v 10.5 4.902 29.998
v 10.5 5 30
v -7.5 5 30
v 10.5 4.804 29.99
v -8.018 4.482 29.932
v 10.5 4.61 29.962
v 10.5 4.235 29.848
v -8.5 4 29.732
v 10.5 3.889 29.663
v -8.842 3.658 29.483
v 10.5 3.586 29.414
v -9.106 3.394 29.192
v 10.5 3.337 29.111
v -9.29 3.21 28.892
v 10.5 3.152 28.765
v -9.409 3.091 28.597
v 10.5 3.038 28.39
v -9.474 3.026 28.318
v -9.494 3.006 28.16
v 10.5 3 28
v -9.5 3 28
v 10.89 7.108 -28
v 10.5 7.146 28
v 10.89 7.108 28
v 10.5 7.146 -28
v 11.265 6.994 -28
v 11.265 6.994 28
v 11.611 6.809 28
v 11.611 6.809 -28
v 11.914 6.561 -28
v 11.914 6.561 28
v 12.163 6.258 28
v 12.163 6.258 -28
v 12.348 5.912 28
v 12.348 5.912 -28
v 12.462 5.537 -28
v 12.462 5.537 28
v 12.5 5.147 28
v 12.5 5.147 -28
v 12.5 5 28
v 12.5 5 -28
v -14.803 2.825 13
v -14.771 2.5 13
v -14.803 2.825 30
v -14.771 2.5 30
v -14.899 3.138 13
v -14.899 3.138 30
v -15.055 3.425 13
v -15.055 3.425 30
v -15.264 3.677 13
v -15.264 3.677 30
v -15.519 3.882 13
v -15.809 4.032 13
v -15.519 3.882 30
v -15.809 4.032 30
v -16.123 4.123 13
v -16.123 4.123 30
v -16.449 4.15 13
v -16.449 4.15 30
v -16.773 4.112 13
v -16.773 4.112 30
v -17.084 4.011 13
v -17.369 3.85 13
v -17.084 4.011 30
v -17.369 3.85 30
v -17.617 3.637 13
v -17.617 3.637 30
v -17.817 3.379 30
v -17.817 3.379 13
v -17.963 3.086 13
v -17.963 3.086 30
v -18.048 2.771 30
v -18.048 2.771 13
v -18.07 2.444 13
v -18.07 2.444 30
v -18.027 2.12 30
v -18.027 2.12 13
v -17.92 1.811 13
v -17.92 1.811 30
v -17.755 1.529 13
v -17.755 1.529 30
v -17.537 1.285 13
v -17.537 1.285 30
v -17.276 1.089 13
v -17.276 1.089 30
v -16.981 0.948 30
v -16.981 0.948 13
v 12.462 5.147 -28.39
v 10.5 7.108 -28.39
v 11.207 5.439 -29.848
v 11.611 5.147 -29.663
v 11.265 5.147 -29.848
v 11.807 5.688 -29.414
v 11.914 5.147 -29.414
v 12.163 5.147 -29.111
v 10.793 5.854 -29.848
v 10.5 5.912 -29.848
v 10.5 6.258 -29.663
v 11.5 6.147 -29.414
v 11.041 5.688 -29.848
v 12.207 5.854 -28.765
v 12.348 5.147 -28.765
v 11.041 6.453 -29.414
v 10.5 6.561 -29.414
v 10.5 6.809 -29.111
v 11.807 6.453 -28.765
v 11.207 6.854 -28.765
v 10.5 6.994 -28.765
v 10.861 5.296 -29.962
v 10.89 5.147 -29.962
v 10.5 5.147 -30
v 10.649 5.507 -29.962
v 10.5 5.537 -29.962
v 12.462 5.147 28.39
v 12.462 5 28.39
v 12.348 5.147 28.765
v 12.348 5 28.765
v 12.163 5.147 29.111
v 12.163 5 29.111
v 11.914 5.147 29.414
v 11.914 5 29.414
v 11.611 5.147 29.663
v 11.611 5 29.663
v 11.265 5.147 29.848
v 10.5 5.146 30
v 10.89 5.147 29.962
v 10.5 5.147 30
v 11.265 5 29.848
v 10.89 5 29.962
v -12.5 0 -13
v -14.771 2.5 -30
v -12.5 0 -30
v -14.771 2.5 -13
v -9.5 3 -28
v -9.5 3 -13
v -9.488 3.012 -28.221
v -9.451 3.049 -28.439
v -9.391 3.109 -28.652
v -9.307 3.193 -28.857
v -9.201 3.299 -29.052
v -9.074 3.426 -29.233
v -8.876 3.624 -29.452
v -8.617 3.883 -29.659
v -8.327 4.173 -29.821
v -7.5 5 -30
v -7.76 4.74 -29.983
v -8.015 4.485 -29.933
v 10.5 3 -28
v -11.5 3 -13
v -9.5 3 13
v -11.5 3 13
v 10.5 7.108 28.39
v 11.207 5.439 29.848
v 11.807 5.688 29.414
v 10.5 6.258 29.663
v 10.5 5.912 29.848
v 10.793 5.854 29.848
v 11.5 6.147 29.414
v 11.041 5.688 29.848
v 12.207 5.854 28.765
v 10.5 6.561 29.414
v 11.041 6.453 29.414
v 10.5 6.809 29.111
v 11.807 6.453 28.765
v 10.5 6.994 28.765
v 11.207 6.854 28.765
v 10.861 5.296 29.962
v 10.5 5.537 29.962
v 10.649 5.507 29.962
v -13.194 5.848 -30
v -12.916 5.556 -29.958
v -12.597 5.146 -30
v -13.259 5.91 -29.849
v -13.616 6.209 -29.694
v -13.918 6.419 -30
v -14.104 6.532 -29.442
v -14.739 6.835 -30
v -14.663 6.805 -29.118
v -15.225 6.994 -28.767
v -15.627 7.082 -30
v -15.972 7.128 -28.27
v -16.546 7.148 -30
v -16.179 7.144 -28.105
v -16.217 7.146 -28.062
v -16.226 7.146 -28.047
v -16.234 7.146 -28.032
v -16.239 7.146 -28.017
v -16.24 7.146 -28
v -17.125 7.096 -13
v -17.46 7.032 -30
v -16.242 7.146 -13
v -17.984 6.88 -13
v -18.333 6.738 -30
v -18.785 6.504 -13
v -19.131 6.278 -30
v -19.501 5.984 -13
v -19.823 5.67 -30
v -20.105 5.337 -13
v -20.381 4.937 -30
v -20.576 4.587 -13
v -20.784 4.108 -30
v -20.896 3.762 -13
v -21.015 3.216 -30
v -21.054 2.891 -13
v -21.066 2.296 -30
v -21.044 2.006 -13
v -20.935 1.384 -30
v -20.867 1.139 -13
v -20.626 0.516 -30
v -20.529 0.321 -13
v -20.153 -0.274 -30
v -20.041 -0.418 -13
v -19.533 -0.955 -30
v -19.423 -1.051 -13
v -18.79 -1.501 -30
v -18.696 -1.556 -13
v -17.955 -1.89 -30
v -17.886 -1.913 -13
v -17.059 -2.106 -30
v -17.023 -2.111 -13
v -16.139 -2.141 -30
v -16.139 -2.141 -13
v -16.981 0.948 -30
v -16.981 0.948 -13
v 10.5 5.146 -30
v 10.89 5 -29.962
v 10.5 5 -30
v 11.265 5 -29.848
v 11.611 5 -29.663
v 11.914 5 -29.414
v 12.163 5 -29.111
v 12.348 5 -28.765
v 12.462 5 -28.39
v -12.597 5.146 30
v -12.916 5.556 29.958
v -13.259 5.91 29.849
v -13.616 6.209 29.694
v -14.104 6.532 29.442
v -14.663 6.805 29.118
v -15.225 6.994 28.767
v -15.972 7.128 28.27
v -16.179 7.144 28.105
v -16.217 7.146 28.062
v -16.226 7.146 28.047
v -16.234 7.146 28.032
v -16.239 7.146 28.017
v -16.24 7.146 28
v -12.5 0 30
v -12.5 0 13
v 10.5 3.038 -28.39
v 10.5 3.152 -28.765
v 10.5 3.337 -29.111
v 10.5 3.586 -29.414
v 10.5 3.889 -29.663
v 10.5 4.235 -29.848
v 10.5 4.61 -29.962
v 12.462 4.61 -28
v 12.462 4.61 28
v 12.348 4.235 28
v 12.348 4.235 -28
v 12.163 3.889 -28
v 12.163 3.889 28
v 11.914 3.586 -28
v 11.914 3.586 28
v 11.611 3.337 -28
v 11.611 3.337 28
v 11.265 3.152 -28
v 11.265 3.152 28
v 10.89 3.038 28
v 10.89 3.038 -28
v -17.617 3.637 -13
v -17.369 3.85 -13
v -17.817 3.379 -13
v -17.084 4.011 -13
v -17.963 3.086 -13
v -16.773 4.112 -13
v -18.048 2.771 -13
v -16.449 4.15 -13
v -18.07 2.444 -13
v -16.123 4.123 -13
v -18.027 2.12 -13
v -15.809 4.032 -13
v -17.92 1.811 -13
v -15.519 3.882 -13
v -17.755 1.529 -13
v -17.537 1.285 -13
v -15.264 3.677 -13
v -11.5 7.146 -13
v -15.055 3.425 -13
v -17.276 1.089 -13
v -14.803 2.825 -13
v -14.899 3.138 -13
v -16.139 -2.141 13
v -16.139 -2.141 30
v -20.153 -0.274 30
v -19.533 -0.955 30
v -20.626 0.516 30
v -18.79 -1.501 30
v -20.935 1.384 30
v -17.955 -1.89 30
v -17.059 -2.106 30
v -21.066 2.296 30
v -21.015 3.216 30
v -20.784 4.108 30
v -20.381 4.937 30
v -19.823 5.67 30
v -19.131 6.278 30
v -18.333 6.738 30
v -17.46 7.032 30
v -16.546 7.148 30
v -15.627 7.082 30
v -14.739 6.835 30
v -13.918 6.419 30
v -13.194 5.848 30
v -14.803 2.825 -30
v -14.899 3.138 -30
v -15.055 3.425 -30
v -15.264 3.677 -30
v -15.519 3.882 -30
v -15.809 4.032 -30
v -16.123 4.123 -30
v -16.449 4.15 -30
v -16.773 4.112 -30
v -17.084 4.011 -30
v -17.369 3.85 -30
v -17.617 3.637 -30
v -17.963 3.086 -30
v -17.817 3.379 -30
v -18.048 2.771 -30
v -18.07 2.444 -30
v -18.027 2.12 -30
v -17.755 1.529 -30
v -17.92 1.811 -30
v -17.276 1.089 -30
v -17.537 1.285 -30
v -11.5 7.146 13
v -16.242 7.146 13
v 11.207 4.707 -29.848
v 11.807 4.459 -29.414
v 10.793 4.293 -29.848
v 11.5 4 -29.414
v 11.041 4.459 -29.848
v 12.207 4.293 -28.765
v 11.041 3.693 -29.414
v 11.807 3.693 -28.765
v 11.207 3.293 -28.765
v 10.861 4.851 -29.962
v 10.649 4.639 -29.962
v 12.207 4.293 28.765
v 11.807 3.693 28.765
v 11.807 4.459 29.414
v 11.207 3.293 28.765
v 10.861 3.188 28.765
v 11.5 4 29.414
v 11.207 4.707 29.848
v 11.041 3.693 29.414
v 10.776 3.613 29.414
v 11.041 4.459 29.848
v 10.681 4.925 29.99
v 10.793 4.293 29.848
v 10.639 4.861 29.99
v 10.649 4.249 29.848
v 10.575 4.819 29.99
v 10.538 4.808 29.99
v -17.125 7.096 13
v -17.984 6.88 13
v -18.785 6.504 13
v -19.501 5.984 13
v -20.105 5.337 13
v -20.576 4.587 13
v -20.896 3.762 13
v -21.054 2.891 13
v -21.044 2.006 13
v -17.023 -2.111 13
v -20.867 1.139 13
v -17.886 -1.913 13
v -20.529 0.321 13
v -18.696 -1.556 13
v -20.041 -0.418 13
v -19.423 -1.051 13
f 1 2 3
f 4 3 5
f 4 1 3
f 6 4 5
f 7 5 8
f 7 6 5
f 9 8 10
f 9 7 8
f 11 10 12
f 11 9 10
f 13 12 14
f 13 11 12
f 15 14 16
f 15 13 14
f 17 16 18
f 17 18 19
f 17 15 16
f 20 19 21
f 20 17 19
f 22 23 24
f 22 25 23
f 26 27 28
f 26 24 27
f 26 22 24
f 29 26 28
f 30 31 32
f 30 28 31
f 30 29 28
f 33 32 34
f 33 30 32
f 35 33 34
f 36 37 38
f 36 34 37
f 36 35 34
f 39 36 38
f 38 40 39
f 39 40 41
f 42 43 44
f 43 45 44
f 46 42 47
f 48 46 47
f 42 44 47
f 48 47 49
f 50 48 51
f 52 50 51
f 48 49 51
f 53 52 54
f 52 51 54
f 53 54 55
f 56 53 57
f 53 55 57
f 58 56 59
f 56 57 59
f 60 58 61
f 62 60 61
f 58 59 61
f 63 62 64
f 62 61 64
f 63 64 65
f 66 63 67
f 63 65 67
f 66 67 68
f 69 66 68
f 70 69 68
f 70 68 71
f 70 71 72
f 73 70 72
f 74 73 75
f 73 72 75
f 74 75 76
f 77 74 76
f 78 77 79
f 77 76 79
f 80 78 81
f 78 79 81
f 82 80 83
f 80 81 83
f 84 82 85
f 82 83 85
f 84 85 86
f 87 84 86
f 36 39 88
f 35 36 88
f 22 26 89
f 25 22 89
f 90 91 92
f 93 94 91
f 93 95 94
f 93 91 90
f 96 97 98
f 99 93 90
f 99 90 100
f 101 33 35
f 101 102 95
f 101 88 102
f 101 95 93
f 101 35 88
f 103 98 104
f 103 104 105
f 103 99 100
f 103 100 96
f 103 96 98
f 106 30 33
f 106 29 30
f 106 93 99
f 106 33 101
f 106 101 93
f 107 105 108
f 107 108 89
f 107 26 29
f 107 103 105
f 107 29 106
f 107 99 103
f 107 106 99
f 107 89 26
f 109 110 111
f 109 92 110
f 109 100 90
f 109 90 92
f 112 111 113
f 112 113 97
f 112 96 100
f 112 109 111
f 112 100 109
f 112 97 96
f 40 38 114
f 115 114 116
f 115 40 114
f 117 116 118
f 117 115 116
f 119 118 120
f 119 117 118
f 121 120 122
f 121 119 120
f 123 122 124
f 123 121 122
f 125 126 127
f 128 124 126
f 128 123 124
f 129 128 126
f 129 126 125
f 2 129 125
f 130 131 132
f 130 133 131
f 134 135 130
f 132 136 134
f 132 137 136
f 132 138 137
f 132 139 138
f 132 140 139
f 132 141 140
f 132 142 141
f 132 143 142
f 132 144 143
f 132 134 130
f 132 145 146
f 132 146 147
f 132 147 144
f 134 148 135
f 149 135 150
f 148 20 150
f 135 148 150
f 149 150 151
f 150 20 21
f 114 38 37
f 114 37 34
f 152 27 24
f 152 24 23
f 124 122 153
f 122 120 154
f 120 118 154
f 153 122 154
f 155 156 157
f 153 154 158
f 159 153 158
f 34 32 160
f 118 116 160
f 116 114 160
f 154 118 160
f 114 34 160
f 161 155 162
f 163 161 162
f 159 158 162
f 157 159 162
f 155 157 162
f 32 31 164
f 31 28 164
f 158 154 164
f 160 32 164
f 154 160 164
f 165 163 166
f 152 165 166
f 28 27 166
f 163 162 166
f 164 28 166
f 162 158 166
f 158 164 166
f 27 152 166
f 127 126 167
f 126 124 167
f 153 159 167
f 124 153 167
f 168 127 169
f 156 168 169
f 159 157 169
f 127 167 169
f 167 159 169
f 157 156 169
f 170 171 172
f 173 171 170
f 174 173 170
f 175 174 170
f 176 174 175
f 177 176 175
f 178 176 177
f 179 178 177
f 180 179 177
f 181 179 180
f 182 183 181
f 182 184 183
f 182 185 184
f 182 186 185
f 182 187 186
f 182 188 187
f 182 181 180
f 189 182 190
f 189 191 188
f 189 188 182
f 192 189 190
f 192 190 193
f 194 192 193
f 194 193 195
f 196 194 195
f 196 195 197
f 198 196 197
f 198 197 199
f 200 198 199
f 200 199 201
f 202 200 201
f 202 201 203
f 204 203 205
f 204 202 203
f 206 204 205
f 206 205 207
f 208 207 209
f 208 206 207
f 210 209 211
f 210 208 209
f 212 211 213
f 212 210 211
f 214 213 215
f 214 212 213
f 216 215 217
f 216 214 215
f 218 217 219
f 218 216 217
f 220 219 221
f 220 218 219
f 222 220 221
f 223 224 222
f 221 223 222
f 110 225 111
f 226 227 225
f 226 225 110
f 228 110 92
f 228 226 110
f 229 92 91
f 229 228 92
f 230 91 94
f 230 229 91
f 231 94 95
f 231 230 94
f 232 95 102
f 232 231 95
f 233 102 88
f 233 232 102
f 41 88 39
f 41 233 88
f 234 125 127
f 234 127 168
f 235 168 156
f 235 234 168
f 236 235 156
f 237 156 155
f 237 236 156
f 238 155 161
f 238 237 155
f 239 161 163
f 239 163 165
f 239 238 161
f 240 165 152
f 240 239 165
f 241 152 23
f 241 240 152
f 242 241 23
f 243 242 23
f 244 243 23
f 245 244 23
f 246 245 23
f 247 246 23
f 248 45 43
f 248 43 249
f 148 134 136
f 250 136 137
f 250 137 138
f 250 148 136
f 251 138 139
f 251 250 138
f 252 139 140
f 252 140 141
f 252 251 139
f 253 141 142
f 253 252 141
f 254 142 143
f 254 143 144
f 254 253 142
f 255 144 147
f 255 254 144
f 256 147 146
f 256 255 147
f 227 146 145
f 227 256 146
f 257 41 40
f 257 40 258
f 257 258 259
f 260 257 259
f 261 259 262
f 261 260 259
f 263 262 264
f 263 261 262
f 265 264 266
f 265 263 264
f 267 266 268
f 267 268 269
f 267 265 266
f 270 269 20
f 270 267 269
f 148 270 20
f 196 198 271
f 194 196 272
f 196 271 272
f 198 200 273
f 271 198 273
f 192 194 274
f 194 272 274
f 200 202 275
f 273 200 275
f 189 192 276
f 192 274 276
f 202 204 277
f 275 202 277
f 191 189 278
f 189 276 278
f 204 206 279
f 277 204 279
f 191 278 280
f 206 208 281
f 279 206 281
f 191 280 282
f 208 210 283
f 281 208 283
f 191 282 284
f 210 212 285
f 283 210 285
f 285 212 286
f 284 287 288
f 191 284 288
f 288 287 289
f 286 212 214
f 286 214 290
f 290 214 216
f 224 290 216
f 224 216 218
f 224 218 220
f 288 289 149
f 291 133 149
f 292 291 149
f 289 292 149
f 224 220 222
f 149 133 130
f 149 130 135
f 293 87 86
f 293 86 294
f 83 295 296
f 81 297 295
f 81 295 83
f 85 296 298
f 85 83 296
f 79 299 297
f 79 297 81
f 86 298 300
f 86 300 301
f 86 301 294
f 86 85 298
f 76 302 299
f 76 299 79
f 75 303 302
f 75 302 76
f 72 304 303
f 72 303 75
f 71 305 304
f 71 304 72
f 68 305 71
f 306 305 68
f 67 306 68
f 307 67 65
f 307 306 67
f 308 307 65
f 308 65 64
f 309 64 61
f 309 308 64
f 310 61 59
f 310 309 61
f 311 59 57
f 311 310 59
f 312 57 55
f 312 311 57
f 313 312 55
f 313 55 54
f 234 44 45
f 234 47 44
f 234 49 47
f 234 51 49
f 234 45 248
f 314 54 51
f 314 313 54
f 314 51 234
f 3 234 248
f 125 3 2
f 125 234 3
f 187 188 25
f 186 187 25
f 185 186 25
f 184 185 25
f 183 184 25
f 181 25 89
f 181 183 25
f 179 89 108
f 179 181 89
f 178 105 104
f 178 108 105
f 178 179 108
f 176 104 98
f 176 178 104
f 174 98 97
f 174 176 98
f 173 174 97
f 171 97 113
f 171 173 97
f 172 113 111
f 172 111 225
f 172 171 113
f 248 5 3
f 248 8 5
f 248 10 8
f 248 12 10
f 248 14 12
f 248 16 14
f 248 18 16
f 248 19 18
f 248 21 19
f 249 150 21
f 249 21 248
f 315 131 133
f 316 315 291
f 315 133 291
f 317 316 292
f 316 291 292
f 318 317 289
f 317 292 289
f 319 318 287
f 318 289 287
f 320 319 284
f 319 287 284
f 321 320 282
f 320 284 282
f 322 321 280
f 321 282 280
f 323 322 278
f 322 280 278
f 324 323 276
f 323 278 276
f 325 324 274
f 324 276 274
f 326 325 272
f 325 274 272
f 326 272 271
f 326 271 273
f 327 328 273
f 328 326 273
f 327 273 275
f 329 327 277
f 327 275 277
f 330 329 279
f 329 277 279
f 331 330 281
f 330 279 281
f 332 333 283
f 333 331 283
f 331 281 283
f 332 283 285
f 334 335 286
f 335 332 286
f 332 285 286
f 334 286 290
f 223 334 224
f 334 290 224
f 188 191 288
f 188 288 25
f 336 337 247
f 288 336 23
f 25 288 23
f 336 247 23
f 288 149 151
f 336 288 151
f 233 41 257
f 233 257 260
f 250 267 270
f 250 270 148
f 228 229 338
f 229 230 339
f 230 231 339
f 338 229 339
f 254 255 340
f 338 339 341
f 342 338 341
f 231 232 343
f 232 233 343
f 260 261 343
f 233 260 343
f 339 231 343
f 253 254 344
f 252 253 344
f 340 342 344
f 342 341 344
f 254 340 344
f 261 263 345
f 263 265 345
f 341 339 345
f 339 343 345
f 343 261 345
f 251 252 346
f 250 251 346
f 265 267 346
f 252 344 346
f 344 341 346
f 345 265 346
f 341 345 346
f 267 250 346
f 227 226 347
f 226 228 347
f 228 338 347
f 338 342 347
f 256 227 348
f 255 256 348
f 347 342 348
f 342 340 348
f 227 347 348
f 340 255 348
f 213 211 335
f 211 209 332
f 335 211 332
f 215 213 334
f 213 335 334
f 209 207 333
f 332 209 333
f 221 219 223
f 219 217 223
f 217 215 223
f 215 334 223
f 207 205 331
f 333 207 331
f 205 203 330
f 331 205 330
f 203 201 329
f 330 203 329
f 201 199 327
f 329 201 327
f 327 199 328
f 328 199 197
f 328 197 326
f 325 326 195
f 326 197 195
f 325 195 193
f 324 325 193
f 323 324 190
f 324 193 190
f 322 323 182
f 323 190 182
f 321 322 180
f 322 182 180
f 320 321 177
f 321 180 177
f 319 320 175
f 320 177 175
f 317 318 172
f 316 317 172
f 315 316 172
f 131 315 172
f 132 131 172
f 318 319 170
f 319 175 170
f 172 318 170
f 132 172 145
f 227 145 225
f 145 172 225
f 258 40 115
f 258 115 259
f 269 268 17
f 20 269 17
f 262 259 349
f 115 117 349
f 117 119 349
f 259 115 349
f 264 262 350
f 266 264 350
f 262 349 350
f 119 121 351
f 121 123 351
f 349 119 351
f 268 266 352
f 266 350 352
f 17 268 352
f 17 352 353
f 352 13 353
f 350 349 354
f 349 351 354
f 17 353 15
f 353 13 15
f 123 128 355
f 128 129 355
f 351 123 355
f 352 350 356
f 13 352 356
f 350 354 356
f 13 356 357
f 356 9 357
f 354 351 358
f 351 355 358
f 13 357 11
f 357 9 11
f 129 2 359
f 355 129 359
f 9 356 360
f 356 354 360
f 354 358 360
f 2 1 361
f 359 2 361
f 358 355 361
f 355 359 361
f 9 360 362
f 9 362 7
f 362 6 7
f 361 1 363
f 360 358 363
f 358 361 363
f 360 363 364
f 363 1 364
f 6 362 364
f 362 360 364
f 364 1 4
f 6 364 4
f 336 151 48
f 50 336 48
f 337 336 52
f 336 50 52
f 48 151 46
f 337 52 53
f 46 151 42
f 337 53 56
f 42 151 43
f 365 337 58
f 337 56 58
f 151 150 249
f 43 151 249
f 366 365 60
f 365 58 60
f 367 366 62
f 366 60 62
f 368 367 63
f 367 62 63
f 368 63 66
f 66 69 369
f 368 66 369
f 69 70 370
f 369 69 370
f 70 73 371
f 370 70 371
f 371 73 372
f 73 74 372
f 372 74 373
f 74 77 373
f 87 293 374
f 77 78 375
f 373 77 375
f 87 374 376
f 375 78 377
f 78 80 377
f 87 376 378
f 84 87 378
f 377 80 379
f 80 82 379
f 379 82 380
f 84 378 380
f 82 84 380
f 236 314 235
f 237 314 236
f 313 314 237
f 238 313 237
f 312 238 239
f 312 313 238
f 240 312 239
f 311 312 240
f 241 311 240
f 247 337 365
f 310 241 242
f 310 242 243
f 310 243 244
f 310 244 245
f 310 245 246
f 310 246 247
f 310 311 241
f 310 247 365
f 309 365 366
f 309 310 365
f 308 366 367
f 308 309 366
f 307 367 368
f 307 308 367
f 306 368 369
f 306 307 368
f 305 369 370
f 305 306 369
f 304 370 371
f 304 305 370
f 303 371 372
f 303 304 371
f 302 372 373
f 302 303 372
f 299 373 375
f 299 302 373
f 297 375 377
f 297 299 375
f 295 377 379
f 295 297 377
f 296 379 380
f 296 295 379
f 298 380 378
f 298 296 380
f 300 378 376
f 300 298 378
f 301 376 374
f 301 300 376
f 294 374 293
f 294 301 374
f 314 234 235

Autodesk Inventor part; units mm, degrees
ref_plane "YZ Plane" through (0, 0, 0) normal (1, 0, 0) x (0, 1, 0)
ref_plane "XZ Plane" through (0, 0, 0) normal (0, 1, 0) x (-1, 0, 0)
ref_plane "XY Plane" through (0, 0, 0) normal (0, 0, 1) x (1, 0, 0)
sketch "Boceto1" plane through (0, 0, 0) normal (0, 1, 0) x (-1, 0, 0)
  line L0 (-12.5, -30) -> (12.5, -30)
  line L1 (12.5, -30) -> (12.5, 30)
  line L2 (12.5, 30) -> (-12.5, 30)
  line L3 (-12.5, 30) -> (-12.5, -30)
  line L4 (-12.5, -30) -> (12.5, 30) construction
  line L5 (12.5, -30) -> (-12.5, 30) construction
  line L6 (61.5, -13) -> (11.5, -13)
  line L7 (11.5, -13) -> (11.5, 13)
  line L8 (11.5, 13) -> (61.5, 13)
  line L9 (61.5, 13) -> (61.5, -13)
  line L10 (12.5, 0) -> (11.5, 0) construction
  point P0 (0, 0)
  point P1 (12.5, 13)
  point P2 (12.5, -13)
  dimension "d0" = 25
  dimension "d1" = 60
  dimension "d8" = 50
  dimension "d9" = 26
  dimension "d10" = 1
extrude "Extrusión1" add sketch "Boceto1" along normal blind 5 contours L3 L2 L1 L8 L7 L6 L0 | L6 L7 L8 L1
sketch "Boceto2" plane through (-12.5, 0, 30) normal (0, 0, 1) x (1, 0, 0)
  circle A0 centre (-3.9208, 2.5) radius 1.65
  line L0 (0, 0) -> (0, 5) construction
  line L1 (0, 2.5) -> (-8.4797, 2.5) construction
  circle A1 centre (-3.9208, 2.5) radius 4.65
  line L2 (-2.2708, 2.5) -> (0, 0)
  line L3 (-2.2708, 2.5) -> (-26.7468, 29.4468) construction
  line L4 (-6.0334, 6.6424) -> (-3.6387, -2.1414)
  line L5 (0, 5) -> (25, 5) projected
  line L6 (-3.7417, 7.1465) -> (25, 7.1465)
  line L7 (25, 7.1465) -> (25, 5)
  line L8 (25, 5) -> (-3.7417, 5)
  line L9 (-3.7417, 5) -> (-3.7417, 7.1465)
  arc A2 (0, 0) -> (0.7292, 2.5) centre (-3.9208, 2.5) ccw
  line L10 (-6.0334, 6.6424) -> (-1.5623, -1.5075) construction
  point P0 (12.5, 0)
  point P1 (-4.481, 0.948)
  dimension "d4" = 3.3
  dimension "d5" = 3
extrude "Extrusión2" add sketch "Boceto2" against normal blind 60 contours A0 L4 A1 L9 L8 L2 | A0 L4 A1 | L6 L7 L5 A1 | A1 L8 L9
extrude "Extrusión3" cut sketch "Boceto1" along normal through all both and the other way through all contours L6 L7 L8 L1 | L1 L8 L9 L6
sketch "Boceto3" plane through (-16.2417, 7.1465, 30) normal (0, 0, 1) x (1, 0, 0)
  line L0 (3.7417, -7.1465) -> (28.7417, -7.1465) projected
  line L1 (28.7417, -7.1465) -> (28.7417, 0) projected
  line L2 (3.7417, -7.1465) -> (28.7417, -7.1465)
  line L3 (28.7417, -7.1465) -> (28.7417, -4.1465)
  line L4 (28.7417, -4.1465) -> (3.7417, -4.1465)
  line L5 (3.7417, -4.1465) -> (3.7417, -7.1465)
  line L6 (3.7417, -7.1465) -> (6.7417, -4.1465)
  line L7 (3.7417, -7.1465) -> (7.9843, -7.1465) construction
  point P0 (16.2417, -7.1465)
  dimension "d13" = 3
  dimension "d16" = 45
extrude "Extrusión4" cut sketch "Boceto3" against normal blind 60 contours L6 L4 L1 L0
extrude "Extrusión5" cut sketch "Boceto3" along normal up to surface (26 mm away) from surface at -43 contours L5 L4 L6
fillet "Empalme1" radius 2 2 edges at (12.5, 7.1465, 0) (12.5, 3, 0)
fillet "Empalme2" radius 2 10 edges at (11.9142, 6.5608, 30) (12.5, 5.0733, 30) (11.9142, 3.5858, 30) (0.5, 3, 30) (-2.8708, 7.1465, 30) (11.9142, 6.5608, -30) (12.5, 5.0733, -30) (11.9142, 3.5858, -30) (0.5, 3, -30) (-2.8708, 7.1465, -30)
